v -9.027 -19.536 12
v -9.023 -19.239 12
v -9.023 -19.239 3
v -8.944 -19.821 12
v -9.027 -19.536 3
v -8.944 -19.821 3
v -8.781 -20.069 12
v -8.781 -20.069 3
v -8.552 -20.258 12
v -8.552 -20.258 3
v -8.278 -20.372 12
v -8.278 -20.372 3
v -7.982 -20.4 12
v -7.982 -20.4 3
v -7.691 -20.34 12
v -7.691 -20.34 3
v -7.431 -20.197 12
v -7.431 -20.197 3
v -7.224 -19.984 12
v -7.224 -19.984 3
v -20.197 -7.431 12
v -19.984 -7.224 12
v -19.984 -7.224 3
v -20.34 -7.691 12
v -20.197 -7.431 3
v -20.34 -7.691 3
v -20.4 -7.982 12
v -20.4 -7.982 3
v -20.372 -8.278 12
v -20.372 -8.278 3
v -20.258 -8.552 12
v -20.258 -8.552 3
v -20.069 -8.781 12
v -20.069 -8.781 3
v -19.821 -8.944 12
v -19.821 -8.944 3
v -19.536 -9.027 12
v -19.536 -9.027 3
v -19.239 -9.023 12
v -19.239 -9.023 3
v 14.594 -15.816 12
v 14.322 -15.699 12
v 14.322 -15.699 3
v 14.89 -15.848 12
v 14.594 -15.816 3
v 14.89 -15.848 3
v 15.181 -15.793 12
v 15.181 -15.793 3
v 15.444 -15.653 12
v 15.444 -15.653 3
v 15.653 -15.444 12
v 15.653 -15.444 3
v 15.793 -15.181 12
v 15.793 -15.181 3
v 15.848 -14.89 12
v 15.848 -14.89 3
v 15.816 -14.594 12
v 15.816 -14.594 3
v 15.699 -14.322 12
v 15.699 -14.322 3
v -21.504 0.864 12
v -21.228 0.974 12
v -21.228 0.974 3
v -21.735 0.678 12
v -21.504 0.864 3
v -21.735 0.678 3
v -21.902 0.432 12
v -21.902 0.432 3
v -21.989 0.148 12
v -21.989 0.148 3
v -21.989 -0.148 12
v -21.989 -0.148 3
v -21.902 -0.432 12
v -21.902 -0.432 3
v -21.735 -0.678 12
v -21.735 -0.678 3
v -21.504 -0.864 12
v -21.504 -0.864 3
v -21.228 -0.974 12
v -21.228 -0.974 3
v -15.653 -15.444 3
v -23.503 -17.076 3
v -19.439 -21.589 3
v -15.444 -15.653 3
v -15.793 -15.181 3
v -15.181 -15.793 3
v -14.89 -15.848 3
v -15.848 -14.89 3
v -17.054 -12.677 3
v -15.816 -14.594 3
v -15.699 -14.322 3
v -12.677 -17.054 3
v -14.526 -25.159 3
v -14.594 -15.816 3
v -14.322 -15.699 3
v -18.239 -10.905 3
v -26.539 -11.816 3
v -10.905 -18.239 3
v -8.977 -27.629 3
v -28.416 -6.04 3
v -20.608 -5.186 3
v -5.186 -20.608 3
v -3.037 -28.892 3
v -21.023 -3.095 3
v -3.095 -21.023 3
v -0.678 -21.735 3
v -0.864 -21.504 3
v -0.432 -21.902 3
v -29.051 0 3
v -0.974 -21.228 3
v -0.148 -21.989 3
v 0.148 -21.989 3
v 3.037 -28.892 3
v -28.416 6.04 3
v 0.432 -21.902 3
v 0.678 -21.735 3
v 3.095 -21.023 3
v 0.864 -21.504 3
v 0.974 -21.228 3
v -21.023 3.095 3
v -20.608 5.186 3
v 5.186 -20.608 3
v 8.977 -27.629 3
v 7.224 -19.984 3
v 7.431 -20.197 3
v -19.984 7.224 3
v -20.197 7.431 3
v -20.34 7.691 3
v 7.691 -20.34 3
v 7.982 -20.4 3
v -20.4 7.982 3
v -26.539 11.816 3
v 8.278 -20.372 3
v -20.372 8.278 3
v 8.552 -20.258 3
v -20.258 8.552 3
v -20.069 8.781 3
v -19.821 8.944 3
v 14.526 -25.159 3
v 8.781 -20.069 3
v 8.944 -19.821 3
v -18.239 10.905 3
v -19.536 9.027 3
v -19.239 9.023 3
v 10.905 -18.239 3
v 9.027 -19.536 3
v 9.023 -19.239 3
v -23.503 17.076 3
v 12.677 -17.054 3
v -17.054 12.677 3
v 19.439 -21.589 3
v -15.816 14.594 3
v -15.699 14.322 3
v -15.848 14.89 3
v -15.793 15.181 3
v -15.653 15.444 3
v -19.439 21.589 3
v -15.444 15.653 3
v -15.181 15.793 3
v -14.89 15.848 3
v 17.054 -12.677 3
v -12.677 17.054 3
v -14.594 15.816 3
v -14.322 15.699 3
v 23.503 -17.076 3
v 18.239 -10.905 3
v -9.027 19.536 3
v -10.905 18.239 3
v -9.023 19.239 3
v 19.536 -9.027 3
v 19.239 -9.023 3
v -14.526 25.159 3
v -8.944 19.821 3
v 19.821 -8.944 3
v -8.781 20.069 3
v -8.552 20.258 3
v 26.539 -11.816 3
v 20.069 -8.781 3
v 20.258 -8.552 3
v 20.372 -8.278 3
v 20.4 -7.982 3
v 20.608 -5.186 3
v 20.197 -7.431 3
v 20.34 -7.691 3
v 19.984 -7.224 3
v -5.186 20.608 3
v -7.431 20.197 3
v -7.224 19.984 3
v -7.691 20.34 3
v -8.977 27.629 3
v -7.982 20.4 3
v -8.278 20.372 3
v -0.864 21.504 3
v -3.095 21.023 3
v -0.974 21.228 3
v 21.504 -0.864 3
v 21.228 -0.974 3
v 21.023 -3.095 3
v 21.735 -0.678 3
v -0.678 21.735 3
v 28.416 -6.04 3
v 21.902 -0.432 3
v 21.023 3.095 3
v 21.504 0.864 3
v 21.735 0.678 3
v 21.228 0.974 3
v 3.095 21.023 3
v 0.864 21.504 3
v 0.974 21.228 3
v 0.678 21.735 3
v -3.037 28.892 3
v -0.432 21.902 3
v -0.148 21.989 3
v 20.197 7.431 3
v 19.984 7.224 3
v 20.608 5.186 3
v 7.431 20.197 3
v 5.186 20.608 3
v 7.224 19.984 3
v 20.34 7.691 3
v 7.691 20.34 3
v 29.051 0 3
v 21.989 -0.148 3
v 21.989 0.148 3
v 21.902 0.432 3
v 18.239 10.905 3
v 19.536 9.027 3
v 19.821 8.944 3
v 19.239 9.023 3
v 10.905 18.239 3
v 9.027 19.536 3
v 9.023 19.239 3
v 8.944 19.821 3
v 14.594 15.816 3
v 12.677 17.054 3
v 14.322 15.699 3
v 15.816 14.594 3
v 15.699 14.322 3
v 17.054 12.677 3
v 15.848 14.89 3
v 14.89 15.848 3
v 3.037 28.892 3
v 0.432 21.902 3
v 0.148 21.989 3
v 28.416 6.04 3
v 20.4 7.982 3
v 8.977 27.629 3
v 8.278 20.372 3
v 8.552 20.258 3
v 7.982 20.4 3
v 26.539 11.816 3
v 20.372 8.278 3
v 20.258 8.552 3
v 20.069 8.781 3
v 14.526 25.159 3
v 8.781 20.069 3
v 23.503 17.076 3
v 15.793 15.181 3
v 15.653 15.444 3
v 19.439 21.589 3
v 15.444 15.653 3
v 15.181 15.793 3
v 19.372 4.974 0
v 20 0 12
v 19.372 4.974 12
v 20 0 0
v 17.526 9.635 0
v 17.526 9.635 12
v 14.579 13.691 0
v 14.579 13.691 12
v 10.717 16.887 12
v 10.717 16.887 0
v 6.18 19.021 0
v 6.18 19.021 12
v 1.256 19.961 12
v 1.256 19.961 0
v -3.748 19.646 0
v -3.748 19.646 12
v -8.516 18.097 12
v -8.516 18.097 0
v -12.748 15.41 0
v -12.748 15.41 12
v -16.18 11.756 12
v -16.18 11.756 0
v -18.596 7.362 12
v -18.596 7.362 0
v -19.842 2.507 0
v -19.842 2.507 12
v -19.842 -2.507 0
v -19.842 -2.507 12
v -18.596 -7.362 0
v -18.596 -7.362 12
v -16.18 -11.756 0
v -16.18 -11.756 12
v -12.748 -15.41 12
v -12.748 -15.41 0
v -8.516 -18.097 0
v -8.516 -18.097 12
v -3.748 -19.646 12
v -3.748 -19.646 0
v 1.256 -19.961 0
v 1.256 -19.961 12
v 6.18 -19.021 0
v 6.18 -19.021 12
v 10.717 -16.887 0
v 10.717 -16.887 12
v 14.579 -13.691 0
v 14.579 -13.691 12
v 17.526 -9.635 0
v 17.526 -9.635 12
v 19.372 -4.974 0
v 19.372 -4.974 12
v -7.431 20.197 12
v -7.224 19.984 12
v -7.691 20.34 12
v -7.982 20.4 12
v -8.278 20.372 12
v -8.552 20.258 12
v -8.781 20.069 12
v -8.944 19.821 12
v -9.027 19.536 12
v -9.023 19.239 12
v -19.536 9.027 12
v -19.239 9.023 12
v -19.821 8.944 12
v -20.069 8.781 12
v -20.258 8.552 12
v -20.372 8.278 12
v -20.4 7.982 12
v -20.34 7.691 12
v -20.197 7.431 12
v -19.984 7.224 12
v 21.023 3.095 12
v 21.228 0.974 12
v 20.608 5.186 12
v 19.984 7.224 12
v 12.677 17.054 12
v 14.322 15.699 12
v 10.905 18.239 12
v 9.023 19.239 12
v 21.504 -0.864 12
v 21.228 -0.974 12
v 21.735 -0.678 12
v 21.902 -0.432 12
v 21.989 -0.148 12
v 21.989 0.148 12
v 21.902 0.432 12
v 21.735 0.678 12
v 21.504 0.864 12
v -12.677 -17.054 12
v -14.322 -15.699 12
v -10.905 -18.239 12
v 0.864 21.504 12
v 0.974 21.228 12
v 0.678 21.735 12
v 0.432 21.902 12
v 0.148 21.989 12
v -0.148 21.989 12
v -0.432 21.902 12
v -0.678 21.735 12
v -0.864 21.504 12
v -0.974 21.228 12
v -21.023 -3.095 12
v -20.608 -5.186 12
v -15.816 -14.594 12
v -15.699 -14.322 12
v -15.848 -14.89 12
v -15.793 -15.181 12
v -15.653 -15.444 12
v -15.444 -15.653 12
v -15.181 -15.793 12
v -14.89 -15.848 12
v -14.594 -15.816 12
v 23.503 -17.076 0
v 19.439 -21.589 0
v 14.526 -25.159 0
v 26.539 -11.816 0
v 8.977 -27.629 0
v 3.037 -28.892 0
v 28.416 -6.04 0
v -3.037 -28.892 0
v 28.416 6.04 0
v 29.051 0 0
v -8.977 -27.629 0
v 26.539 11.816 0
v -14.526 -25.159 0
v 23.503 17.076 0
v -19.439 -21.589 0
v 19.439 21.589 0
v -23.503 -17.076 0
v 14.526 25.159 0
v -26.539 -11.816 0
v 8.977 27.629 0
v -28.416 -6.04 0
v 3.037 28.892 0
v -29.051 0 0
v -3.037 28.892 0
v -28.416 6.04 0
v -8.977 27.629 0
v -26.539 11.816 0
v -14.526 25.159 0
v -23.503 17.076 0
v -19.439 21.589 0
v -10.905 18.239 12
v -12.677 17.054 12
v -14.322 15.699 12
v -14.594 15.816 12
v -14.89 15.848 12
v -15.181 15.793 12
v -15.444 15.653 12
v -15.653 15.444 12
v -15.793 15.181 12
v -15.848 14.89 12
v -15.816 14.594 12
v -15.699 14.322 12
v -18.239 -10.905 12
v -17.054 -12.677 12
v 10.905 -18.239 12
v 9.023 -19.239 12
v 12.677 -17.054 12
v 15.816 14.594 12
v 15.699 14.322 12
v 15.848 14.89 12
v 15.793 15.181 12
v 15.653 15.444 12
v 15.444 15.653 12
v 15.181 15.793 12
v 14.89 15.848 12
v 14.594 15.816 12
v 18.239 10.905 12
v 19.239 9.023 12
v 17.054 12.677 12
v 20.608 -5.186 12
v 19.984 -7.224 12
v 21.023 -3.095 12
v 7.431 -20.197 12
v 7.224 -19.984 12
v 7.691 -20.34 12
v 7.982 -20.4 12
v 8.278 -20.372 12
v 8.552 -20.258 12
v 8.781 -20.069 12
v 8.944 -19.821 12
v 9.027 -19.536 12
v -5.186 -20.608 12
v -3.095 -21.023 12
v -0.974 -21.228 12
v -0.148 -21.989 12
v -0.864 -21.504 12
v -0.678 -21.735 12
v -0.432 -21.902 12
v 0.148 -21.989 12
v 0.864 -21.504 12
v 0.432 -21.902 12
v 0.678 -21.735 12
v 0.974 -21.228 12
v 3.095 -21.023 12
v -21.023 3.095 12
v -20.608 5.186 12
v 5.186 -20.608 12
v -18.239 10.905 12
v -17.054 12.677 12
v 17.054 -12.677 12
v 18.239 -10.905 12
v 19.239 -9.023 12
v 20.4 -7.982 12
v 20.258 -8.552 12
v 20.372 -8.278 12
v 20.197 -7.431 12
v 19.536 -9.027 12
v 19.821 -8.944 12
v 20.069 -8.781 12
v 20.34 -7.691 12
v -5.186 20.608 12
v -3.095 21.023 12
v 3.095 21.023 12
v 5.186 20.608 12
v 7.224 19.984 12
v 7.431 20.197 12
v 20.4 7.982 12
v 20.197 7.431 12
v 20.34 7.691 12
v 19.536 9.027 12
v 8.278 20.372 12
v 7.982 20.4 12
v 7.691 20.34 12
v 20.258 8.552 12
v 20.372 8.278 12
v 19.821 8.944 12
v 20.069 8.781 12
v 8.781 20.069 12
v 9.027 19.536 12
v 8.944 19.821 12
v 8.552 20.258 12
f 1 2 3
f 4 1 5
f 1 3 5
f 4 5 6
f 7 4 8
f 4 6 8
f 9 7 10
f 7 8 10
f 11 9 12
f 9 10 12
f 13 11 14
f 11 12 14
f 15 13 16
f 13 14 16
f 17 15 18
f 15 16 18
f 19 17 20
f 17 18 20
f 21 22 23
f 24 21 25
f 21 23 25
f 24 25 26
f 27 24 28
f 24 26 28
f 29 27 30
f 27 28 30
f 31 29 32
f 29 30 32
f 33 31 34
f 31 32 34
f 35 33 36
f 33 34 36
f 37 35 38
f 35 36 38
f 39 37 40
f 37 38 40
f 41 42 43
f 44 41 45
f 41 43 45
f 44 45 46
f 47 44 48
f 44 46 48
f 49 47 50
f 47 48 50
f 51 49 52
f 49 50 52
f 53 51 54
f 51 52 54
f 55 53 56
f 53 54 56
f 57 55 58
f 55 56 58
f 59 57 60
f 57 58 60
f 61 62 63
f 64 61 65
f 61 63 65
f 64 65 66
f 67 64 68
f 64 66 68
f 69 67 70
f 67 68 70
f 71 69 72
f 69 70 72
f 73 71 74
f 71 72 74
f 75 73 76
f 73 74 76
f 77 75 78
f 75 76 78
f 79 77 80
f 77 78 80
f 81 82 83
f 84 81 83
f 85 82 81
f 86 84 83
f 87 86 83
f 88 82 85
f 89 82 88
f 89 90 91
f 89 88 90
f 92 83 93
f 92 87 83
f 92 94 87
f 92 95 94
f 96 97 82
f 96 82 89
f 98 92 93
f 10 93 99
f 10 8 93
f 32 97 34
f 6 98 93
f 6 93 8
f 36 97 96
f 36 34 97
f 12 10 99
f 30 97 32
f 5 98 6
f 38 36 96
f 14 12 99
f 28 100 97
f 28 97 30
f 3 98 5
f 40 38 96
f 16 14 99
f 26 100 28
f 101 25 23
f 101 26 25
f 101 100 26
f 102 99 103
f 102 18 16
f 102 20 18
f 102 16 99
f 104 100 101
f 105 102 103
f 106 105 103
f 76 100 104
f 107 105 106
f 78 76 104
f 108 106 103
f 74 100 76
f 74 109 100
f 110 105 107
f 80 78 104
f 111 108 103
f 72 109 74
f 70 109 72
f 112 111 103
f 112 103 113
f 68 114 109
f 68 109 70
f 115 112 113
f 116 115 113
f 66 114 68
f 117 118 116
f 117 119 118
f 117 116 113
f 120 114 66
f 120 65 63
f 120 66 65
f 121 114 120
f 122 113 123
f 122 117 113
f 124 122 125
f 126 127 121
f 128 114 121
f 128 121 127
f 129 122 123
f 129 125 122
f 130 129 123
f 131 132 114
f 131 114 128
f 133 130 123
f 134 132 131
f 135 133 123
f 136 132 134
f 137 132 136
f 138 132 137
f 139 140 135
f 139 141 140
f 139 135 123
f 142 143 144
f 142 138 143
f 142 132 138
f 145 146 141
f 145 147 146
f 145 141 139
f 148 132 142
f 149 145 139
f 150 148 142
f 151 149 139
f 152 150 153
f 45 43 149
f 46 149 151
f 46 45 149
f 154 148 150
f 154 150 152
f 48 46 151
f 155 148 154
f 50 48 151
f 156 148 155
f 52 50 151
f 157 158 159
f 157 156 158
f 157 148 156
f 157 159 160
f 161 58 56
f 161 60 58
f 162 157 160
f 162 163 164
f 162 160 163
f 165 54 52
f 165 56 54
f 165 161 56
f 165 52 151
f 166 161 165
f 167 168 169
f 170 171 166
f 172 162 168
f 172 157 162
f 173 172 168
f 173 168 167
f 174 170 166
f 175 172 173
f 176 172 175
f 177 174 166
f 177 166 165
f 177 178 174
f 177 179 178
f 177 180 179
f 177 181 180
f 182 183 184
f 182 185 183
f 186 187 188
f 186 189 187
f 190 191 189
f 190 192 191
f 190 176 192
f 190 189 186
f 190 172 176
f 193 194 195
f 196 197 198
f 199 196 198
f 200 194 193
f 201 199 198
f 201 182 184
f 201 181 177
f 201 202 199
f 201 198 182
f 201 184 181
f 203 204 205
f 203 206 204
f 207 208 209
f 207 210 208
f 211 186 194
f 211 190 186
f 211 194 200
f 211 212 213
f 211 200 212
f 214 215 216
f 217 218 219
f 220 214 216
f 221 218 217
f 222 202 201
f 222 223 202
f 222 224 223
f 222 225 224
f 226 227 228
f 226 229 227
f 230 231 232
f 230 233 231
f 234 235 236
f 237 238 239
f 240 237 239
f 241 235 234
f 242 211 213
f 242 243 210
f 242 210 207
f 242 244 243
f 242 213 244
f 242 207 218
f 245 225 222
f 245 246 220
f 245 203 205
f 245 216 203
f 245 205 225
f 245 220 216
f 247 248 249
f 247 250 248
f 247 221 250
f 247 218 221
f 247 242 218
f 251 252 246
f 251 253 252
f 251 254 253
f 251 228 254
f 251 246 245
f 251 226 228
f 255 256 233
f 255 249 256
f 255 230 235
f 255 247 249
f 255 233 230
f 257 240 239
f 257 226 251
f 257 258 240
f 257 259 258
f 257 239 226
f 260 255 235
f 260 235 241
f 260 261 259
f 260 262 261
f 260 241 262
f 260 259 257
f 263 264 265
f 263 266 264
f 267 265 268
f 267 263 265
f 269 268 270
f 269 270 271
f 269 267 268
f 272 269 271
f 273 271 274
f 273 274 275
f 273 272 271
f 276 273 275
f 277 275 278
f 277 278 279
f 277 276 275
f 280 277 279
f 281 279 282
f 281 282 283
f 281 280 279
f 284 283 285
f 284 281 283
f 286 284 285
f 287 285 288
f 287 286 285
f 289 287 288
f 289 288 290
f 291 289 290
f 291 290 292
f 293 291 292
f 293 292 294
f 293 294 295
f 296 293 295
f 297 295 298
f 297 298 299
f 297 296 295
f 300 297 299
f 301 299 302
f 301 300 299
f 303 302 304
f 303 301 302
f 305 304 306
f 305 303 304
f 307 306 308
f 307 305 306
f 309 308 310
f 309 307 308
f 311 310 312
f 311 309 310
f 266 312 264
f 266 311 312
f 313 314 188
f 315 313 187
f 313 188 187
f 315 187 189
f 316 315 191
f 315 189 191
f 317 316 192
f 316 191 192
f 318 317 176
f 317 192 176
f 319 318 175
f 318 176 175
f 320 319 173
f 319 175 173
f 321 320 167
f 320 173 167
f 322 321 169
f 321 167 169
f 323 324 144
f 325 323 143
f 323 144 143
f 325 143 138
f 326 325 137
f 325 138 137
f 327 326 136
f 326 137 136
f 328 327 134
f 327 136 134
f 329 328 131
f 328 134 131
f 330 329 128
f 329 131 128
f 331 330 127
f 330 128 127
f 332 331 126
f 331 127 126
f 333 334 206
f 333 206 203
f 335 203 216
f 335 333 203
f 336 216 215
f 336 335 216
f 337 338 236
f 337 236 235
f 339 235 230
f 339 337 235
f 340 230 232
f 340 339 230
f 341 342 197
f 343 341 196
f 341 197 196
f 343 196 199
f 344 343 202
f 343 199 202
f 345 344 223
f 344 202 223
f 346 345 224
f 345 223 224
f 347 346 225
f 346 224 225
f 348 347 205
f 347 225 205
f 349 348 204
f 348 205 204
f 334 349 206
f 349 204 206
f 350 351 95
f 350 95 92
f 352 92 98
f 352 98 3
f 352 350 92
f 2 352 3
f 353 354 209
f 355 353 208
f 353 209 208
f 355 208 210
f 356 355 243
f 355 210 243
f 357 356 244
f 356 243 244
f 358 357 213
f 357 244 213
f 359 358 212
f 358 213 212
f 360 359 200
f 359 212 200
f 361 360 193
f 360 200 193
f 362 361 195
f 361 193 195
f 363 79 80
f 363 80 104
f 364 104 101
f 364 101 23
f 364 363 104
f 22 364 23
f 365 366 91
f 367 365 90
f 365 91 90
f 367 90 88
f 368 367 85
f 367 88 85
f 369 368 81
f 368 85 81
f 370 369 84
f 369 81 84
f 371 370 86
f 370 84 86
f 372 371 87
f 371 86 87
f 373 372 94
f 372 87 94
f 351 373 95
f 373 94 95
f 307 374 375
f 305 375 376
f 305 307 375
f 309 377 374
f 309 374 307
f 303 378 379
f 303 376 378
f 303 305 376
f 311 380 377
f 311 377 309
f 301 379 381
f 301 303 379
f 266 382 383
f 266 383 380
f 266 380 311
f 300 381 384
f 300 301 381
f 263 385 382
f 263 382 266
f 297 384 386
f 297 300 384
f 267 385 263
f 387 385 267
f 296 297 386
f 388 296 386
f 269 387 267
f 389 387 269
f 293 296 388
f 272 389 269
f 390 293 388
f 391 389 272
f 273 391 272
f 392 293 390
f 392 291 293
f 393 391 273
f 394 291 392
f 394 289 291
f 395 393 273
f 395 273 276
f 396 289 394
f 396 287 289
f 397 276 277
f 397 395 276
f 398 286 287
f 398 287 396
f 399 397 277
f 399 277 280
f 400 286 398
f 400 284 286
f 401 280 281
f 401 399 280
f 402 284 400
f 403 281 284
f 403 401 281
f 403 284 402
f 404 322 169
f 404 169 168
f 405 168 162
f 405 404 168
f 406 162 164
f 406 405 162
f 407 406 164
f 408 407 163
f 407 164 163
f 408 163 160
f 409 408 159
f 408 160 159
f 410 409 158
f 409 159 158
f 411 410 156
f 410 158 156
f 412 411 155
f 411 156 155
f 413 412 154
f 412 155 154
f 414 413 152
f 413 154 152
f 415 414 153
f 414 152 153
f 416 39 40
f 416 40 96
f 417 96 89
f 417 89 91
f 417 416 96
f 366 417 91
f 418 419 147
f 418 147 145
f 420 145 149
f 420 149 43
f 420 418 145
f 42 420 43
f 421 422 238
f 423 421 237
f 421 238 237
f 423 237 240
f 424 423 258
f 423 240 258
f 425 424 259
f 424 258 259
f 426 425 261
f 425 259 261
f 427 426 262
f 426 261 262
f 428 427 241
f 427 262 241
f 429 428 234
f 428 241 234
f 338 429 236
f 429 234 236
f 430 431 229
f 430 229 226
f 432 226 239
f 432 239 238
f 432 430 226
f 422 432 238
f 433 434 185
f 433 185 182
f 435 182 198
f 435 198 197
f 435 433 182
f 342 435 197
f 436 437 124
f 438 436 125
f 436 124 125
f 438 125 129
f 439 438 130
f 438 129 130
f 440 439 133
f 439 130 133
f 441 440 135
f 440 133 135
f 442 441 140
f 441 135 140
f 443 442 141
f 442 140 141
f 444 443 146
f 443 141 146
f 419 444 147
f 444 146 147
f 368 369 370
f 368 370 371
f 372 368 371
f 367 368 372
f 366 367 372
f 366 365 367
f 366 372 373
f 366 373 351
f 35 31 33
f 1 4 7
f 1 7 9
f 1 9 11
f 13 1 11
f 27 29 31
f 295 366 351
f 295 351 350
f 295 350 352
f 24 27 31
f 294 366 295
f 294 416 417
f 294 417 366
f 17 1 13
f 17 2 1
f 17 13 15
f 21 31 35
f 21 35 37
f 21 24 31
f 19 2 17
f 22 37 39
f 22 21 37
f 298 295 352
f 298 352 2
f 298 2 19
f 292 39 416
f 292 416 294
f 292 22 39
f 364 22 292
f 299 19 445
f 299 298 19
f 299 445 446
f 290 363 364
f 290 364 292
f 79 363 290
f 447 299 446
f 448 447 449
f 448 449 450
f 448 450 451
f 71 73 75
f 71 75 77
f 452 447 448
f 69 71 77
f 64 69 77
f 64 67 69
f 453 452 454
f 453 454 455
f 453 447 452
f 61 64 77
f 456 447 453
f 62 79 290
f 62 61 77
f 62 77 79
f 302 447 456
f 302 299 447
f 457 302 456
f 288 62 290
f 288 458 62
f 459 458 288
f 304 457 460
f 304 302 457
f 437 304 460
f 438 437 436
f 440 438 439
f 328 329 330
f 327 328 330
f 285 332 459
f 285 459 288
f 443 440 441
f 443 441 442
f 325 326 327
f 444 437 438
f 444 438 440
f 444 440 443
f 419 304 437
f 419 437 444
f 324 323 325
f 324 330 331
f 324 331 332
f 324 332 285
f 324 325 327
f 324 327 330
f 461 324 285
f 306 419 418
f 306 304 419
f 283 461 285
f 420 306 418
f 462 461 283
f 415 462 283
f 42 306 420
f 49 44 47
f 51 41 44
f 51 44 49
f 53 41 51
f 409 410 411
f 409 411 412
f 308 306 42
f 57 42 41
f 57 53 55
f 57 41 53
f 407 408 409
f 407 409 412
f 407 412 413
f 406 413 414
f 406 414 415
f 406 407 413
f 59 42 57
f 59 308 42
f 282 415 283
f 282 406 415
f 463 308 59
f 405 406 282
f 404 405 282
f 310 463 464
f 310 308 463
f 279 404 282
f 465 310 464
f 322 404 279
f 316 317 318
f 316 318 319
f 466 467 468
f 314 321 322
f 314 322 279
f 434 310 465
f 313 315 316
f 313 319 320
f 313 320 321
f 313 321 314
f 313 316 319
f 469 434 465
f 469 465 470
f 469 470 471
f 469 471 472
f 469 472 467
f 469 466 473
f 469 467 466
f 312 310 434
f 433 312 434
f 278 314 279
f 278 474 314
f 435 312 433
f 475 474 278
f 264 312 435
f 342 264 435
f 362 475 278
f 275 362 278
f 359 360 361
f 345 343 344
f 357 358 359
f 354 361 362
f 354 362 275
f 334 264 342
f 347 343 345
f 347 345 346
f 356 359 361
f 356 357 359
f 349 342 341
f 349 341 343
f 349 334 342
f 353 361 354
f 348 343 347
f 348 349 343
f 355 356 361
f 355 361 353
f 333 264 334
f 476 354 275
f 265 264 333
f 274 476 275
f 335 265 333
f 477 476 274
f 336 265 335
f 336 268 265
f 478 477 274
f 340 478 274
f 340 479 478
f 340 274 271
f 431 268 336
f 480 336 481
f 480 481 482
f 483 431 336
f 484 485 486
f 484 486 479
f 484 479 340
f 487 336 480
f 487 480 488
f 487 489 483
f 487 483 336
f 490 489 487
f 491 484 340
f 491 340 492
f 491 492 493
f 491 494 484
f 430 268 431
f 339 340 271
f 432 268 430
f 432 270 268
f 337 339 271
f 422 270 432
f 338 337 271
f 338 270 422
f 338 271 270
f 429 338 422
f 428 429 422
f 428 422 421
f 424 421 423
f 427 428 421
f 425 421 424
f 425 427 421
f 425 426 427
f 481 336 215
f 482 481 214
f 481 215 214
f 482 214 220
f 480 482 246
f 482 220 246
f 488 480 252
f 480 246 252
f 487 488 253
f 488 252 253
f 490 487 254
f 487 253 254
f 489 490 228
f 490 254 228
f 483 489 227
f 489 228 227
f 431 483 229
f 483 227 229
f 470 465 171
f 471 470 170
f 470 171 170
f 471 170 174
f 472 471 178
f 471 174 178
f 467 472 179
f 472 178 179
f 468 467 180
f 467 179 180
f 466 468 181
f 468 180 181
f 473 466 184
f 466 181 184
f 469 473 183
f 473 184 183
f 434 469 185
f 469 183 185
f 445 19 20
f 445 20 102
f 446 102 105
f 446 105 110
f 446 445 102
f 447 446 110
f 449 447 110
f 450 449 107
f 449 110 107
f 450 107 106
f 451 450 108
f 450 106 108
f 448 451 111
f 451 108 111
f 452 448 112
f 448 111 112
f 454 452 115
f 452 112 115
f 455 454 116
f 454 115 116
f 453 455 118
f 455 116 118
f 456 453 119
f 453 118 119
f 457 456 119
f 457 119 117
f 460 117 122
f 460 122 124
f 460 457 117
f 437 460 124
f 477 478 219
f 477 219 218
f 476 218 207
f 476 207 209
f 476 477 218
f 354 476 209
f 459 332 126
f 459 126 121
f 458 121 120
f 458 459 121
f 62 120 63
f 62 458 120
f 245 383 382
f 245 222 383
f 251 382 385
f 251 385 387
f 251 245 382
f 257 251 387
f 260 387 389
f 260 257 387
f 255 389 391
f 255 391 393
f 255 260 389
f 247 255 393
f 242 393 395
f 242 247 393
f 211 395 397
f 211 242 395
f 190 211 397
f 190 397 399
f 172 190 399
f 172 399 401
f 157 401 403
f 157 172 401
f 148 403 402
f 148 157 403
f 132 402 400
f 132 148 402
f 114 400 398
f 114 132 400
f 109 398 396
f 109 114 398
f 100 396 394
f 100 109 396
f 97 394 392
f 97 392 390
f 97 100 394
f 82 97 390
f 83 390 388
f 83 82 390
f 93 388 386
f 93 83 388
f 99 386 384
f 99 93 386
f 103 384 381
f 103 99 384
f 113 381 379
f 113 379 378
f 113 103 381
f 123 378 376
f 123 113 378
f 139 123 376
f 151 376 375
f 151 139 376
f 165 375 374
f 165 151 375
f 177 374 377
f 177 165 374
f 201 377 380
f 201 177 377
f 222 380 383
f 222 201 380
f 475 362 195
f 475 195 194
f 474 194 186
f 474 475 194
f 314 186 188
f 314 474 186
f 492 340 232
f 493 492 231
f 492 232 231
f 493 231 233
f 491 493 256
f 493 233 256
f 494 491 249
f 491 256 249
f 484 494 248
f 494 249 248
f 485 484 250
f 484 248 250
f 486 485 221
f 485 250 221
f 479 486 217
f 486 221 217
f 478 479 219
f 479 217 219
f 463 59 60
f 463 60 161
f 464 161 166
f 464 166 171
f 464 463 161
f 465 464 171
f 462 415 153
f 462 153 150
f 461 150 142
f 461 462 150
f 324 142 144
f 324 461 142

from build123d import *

# Parameters (mm, degrees)
F3_DEPTH        = 9
F3_COPIES_COUNT = 16


# Not quite as in the source:
# - a pattern or mirror of a feature is missing from the dataset's text; its kind, count and spacing are read off the source's solid


with BuildPart() as f1:
    # F0 (on Front) → F1 (revolve)
    with BuildSketch(Plane.XZ):
        Polygon((20, 12), (20, 0), (29.0510931471, 0), (29.0510931471, 3), (21.25, 3), (21.25, 12), align=None)
    revolve(axis=Axis((0, 0, 7.2627740937), (0, 0, 1)))

    # F2 (on face) → F3 (join, through all)
    with BuildSketch(Plane.XY.offset(3)):
        with BuildLine():
            ThreePointArc((-0.9737363442, 21.2276785714), (0, 21.25), (0.9737363442, 21.2276785714))
            ThreePointArc((0.9737363442, 21.2276785714), (0, 22), (-0.9737363442, 21.2276785714))
        make_face()
    f3 = extrude(amount=F3_DEPTH)

    # F3_copies: F3 ×16 about axis
    f3_copies_axis = Axis((0, 0, 0), (0, 0, 1))
    for i in range(1, F3_COPIES_COUNT):
        add(f3.rotate(f3_copies_axis, i * 360 / F3_COPIES_COUNT))


solid = f1.part
